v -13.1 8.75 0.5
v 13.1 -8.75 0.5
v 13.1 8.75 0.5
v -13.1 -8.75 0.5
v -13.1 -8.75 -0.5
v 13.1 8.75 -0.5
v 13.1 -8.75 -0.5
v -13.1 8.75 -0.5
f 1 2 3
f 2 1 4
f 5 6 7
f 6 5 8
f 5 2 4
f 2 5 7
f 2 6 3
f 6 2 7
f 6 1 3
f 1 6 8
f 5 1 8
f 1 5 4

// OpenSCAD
translate([-13.1, -8.75, -0.5])
    cube([26.2, 17.5, 1.0]);
